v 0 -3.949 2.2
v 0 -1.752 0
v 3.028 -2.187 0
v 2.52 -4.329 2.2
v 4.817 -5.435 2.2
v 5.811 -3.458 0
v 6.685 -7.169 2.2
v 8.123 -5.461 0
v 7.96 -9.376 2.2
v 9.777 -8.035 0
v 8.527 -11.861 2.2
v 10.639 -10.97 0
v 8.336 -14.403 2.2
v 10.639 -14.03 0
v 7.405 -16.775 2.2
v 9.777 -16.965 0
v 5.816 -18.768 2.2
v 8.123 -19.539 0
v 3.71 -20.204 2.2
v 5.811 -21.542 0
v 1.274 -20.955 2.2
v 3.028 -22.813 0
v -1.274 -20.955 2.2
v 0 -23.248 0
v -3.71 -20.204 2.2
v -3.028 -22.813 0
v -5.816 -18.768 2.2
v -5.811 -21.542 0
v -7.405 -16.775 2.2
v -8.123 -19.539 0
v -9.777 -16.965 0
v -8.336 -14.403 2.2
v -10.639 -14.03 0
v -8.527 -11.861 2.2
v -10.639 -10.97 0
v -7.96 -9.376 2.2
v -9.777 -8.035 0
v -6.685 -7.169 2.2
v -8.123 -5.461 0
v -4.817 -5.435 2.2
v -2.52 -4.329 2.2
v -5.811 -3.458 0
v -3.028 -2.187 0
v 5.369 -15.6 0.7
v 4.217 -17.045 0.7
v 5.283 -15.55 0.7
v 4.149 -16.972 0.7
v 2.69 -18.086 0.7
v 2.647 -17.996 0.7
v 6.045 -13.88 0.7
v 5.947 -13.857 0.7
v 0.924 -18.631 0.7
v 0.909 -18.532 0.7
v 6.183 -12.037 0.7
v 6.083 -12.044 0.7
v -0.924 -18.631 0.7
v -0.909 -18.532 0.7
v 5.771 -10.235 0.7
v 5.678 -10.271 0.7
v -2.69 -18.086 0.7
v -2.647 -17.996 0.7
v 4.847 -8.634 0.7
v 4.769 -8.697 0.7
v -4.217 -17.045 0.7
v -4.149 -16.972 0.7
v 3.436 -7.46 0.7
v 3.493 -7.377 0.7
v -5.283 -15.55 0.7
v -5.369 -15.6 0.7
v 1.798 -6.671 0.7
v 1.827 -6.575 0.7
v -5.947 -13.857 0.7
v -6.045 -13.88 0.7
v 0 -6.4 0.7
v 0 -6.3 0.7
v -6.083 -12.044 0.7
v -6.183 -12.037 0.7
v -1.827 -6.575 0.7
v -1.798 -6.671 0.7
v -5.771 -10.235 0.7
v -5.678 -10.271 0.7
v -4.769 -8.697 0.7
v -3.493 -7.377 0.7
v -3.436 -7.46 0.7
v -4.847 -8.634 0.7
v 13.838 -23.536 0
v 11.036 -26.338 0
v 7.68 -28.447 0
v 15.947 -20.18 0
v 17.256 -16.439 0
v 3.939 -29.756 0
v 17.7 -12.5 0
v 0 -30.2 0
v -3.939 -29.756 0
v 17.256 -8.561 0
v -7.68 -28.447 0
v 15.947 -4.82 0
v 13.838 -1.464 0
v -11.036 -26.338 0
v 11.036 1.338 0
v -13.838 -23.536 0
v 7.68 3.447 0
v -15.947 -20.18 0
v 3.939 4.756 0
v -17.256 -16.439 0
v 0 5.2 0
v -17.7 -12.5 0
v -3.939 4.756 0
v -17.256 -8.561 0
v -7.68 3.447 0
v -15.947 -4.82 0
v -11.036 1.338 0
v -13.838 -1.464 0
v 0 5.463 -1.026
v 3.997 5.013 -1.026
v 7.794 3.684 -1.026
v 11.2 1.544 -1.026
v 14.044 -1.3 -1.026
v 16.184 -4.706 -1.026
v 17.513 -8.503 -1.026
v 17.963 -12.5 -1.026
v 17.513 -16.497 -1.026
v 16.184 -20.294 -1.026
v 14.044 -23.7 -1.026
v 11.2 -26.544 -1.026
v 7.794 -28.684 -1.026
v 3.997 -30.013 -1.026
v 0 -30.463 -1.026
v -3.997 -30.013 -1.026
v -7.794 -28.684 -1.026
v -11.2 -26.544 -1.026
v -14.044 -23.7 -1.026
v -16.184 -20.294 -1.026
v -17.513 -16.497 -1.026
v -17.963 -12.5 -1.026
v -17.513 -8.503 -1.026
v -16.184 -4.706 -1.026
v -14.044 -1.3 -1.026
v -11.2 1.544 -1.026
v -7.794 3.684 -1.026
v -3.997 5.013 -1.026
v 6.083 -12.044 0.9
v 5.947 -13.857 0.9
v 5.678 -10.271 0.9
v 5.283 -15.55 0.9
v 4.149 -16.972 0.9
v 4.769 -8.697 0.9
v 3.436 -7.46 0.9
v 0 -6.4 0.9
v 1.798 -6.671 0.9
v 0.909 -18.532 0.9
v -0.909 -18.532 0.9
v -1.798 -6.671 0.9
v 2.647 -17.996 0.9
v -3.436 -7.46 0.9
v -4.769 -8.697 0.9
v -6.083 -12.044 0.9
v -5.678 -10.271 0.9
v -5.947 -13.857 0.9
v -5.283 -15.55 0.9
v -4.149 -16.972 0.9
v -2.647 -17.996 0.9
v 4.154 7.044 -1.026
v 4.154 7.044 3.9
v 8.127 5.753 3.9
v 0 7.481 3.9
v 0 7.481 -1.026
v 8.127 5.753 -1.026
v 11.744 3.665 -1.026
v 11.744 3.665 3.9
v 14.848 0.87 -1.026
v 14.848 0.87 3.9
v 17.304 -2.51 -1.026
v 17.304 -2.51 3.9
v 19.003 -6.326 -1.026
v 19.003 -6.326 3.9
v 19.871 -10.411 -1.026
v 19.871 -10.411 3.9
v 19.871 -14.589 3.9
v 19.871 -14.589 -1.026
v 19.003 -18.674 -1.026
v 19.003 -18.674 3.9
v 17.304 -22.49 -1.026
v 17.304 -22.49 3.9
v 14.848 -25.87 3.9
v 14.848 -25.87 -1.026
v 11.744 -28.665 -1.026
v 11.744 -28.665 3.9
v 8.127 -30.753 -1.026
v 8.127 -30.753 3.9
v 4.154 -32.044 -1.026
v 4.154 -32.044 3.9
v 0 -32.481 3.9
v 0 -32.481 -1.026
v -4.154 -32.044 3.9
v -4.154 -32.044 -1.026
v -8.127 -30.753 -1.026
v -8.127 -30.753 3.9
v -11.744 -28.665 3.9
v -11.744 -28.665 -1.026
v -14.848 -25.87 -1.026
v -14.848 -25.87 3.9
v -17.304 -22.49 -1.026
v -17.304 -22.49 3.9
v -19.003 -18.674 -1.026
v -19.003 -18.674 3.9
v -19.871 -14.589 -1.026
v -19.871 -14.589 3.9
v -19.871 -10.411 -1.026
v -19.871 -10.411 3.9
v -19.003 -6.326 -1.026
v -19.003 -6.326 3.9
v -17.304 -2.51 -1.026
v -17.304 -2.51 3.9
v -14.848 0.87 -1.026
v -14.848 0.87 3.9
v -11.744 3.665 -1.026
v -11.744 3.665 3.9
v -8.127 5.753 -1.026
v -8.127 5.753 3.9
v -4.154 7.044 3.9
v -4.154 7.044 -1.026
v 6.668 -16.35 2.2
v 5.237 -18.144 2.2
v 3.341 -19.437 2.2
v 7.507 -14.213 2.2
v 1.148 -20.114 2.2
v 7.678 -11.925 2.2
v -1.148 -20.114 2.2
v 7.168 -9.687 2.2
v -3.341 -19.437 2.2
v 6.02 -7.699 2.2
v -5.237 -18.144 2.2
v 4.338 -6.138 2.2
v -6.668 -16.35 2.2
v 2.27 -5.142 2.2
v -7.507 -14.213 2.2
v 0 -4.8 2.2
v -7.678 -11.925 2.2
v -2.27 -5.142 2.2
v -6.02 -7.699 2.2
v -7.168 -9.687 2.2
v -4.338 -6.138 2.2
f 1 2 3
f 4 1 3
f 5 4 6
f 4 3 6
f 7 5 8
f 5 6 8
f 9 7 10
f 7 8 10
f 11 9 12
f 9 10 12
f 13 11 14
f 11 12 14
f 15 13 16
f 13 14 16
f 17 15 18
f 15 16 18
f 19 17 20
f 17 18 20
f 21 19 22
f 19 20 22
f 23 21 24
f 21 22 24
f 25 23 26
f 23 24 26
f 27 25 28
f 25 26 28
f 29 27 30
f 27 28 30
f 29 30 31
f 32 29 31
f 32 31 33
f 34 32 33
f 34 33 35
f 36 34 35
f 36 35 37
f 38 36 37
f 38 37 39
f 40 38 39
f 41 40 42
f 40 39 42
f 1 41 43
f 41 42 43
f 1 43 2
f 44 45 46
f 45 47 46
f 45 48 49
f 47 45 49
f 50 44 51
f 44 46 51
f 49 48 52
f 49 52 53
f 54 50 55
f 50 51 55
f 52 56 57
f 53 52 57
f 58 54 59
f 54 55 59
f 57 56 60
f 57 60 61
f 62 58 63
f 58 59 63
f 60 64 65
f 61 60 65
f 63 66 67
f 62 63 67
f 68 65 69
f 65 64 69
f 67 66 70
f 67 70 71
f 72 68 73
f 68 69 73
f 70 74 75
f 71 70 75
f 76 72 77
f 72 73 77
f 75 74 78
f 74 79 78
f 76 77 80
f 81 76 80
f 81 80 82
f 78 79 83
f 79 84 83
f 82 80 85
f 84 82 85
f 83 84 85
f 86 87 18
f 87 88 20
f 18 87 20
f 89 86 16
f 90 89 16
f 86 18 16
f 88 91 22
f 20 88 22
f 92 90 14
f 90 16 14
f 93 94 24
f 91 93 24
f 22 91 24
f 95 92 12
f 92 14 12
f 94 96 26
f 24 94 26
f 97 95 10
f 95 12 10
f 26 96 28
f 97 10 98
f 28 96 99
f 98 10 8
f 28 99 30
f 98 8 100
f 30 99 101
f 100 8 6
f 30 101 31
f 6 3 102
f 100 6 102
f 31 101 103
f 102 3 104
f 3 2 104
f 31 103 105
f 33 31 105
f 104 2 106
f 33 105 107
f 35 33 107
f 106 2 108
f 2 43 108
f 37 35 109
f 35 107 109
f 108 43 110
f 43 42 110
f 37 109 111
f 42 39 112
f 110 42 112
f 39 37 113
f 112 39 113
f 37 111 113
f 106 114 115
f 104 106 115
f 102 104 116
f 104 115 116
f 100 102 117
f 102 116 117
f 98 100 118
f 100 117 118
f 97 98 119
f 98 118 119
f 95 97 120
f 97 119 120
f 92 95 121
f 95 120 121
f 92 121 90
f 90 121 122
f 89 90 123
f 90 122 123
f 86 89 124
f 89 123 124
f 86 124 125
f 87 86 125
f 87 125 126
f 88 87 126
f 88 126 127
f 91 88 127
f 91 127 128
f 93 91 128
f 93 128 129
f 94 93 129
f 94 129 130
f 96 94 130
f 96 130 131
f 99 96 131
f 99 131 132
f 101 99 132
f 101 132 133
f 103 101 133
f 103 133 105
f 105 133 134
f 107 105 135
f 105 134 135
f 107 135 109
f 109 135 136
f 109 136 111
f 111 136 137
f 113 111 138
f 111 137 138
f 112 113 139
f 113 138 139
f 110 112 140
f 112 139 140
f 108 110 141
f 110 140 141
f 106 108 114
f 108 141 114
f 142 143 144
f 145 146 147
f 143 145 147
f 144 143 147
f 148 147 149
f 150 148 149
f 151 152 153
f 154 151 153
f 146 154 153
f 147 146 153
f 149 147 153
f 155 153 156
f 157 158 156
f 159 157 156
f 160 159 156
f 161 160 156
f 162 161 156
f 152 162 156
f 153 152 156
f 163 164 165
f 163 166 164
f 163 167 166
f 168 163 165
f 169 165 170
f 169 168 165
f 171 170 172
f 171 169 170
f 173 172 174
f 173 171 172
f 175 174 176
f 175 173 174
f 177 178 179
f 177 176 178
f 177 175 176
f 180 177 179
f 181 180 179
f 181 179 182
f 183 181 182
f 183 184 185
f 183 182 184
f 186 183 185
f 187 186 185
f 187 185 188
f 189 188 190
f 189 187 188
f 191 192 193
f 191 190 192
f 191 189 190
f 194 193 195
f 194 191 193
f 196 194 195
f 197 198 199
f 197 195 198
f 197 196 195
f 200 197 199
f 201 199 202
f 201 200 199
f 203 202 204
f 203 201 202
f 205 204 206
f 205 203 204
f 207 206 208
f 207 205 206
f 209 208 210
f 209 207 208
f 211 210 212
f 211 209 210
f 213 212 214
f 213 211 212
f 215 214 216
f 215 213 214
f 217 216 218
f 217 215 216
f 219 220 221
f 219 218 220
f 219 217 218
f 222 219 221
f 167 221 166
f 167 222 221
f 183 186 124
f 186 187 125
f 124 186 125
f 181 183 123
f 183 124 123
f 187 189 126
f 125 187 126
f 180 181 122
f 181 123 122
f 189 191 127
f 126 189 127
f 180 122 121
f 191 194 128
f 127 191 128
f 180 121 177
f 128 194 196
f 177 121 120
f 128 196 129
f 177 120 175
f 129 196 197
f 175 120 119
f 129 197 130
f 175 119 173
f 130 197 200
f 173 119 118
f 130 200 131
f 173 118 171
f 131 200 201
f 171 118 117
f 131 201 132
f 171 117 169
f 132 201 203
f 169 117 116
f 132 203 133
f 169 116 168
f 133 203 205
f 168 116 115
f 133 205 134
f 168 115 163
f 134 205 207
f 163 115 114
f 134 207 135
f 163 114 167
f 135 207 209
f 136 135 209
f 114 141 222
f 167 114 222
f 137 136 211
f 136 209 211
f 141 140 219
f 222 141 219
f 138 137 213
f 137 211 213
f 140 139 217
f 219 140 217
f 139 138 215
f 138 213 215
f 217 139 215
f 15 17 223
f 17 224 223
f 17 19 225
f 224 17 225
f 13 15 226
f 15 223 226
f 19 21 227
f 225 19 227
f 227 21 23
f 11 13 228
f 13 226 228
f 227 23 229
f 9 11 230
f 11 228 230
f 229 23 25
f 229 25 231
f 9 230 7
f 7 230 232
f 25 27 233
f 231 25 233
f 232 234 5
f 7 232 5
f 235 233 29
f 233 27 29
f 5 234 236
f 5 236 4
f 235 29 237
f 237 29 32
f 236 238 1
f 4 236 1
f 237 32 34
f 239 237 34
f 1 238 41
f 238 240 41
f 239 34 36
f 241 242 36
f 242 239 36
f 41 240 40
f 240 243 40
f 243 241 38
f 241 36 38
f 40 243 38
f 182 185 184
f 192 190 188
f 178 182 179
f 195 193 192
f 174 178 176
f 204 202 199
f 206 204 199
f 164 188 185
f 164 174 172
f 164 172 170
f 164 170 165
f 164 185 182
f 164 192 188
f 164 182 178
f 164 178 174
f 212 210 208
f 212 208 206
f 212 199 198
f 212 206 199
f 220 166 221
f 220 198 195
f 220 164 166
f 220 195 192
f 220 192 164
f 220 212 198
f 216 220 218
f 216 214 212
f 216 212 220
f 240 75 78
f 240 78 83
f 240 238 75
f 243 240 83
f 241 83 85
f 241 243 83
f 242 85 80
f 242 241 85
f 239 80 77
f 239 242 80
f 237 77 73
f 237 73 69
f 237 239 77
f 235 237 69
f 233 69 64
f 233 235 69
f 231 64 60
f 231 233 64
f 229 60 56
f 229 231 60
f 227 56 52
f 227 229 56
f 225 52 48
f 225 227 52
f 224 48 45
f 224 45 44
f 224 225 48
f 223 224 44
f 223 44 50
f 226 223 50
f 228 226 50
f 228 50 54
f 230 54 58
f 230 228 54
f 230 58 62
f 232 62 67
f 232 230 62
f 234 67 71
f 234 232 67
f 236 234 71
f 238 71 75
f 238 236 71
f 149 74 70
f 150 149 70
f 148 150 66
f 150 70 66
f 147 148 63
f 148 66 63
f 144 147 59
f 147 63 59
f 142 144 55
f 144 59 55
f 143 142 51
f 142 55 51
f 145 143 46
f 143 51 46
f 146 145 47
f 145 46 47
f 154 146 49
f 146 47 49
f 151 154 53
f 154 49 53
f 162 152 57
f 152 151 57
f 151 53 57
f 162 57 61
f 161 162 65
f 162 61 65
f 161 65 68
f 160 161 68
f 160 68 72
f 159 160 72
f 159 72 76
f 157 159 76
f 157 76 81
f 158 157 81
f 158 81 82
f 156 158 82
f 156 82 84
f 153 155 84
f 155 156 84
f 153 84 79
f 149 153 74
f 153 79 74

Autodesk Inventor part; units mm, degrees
ref_plane "YZ Plane" through (0, 0, 0) normal (1, 0, 0) x (0, 1, 0)
ref_plane "XZ Plane" through (0, 0, 0) normal (0, 1, 0) x (-1, 0, 0)
ref_plane "XY Plane" through (0, 0, 0) normal (0, 0, 1) x (1, 0, 0)
sketch "Skizze1" plane through (0, 0, 0) normal (1, 0, 0) x (0, 1, 0)
  line L0 (5, 0) -> (-30, 0) projected
  line L1 (5, -3) -> (5, 0)
  line L2 (-3.9492, 2.2) -> (-21.0508, 2.2) projected
  line L3 (-6.3, 0.7) -> (-18.7, 0.7) projected
  line L4 (-12.5, 0.7) -> (-12.5, 5.3428)
  line L5 (5, 0) -> (-2.1515, 0)
  line L6 (-18.5, 0.7) -> (-6.5, 0.7) construction
  line L7 (-6.5, 0.7) -> (-6.5, 0.9) construction
  line L8 (-6.5, 0.9) -> (-18.5, 0.9) construction
  line L9 (-18.5, 0.9) -> (-18.5, 0.7) construction
  line L10 (-18.5, 0.7) -> (-6.5, 0.9) construction
  line L11 (-6.5, 0.7) -> (-18.5, 0.9) construction
  line L12 (-6.3, 0.7) -> (-7.4658, 0.7) construction
  line L13 (-12.5, 0.9) -> (-6.4, 0.9)
  line L14 (-6.4, 0.9) -> (-6.4, 0.7)
  line L15 (-6.3, 0.7) -> (-6.4, 0.7)
  line L16 (-12.5, 0.9) -> (-12.5, 3.9)
  line L17 (-12.5, 3.9) -> (5, 3.9)
  line L18 (5, 3.9) -> (5, 0)
  line L19 (-4.8, 2.2) -> (-6.3, 0.7)
  line L20 (-3.9492, 2.2) -> (-21.0508, 2.2) projected
  line L21 (-1.7515, 0) -> (-3.9503, 2.1989)
  line L22 (-5.7431, 0.4) -> (-4.5431, 1.6) construction
  line L23 (-4.1977, 1.6) -> (-20.8023, 1.6) construction
  line L24 (-4.1977, 1.6) -> (-3.1977, 0.6) construction
  line L25 (-4.1977, 1.6) -> (-20.8023, 1.6) construction
  line L26 (5, 3.9) -> (7.4806, 3.9)
  line L27 (7.4806, 3.9) -> (7.4806, -1.0263)
  line L28 (7.4806, -1.0263) -> (5.458, -1.0263)
  line L29 (5, 0) -> (5.2, 0)
  line L30 (5.2, 0) -> (5.4633, -1.0263)
  point P0 (0, 0)
  point P1 (-5.8, 2.2)
  point P2 (-12.5, 0.8)
  point P3 (-12.5, 0.9)
  point P4 (-1.7515, 0)
  dimension "d0" = 12
  dimension "d1" = 0.2
  dimension "d2" = 6.1
  dimension "d3" = 3
  dimension "d5" = 0.2
revolve "Umdrehung1" add sketch "Skizze1" angle 360 about axis through (0, -12.5, 0.7) along (0, 0, 1) contours L0 L21 L2 L4 L17 L18 | L18 L26 L27 L28 L30 L29 | L19 L3 L14 L13 L4 L2
properties part number "50_ETL_Membrane_Mould_Upper_v0"
